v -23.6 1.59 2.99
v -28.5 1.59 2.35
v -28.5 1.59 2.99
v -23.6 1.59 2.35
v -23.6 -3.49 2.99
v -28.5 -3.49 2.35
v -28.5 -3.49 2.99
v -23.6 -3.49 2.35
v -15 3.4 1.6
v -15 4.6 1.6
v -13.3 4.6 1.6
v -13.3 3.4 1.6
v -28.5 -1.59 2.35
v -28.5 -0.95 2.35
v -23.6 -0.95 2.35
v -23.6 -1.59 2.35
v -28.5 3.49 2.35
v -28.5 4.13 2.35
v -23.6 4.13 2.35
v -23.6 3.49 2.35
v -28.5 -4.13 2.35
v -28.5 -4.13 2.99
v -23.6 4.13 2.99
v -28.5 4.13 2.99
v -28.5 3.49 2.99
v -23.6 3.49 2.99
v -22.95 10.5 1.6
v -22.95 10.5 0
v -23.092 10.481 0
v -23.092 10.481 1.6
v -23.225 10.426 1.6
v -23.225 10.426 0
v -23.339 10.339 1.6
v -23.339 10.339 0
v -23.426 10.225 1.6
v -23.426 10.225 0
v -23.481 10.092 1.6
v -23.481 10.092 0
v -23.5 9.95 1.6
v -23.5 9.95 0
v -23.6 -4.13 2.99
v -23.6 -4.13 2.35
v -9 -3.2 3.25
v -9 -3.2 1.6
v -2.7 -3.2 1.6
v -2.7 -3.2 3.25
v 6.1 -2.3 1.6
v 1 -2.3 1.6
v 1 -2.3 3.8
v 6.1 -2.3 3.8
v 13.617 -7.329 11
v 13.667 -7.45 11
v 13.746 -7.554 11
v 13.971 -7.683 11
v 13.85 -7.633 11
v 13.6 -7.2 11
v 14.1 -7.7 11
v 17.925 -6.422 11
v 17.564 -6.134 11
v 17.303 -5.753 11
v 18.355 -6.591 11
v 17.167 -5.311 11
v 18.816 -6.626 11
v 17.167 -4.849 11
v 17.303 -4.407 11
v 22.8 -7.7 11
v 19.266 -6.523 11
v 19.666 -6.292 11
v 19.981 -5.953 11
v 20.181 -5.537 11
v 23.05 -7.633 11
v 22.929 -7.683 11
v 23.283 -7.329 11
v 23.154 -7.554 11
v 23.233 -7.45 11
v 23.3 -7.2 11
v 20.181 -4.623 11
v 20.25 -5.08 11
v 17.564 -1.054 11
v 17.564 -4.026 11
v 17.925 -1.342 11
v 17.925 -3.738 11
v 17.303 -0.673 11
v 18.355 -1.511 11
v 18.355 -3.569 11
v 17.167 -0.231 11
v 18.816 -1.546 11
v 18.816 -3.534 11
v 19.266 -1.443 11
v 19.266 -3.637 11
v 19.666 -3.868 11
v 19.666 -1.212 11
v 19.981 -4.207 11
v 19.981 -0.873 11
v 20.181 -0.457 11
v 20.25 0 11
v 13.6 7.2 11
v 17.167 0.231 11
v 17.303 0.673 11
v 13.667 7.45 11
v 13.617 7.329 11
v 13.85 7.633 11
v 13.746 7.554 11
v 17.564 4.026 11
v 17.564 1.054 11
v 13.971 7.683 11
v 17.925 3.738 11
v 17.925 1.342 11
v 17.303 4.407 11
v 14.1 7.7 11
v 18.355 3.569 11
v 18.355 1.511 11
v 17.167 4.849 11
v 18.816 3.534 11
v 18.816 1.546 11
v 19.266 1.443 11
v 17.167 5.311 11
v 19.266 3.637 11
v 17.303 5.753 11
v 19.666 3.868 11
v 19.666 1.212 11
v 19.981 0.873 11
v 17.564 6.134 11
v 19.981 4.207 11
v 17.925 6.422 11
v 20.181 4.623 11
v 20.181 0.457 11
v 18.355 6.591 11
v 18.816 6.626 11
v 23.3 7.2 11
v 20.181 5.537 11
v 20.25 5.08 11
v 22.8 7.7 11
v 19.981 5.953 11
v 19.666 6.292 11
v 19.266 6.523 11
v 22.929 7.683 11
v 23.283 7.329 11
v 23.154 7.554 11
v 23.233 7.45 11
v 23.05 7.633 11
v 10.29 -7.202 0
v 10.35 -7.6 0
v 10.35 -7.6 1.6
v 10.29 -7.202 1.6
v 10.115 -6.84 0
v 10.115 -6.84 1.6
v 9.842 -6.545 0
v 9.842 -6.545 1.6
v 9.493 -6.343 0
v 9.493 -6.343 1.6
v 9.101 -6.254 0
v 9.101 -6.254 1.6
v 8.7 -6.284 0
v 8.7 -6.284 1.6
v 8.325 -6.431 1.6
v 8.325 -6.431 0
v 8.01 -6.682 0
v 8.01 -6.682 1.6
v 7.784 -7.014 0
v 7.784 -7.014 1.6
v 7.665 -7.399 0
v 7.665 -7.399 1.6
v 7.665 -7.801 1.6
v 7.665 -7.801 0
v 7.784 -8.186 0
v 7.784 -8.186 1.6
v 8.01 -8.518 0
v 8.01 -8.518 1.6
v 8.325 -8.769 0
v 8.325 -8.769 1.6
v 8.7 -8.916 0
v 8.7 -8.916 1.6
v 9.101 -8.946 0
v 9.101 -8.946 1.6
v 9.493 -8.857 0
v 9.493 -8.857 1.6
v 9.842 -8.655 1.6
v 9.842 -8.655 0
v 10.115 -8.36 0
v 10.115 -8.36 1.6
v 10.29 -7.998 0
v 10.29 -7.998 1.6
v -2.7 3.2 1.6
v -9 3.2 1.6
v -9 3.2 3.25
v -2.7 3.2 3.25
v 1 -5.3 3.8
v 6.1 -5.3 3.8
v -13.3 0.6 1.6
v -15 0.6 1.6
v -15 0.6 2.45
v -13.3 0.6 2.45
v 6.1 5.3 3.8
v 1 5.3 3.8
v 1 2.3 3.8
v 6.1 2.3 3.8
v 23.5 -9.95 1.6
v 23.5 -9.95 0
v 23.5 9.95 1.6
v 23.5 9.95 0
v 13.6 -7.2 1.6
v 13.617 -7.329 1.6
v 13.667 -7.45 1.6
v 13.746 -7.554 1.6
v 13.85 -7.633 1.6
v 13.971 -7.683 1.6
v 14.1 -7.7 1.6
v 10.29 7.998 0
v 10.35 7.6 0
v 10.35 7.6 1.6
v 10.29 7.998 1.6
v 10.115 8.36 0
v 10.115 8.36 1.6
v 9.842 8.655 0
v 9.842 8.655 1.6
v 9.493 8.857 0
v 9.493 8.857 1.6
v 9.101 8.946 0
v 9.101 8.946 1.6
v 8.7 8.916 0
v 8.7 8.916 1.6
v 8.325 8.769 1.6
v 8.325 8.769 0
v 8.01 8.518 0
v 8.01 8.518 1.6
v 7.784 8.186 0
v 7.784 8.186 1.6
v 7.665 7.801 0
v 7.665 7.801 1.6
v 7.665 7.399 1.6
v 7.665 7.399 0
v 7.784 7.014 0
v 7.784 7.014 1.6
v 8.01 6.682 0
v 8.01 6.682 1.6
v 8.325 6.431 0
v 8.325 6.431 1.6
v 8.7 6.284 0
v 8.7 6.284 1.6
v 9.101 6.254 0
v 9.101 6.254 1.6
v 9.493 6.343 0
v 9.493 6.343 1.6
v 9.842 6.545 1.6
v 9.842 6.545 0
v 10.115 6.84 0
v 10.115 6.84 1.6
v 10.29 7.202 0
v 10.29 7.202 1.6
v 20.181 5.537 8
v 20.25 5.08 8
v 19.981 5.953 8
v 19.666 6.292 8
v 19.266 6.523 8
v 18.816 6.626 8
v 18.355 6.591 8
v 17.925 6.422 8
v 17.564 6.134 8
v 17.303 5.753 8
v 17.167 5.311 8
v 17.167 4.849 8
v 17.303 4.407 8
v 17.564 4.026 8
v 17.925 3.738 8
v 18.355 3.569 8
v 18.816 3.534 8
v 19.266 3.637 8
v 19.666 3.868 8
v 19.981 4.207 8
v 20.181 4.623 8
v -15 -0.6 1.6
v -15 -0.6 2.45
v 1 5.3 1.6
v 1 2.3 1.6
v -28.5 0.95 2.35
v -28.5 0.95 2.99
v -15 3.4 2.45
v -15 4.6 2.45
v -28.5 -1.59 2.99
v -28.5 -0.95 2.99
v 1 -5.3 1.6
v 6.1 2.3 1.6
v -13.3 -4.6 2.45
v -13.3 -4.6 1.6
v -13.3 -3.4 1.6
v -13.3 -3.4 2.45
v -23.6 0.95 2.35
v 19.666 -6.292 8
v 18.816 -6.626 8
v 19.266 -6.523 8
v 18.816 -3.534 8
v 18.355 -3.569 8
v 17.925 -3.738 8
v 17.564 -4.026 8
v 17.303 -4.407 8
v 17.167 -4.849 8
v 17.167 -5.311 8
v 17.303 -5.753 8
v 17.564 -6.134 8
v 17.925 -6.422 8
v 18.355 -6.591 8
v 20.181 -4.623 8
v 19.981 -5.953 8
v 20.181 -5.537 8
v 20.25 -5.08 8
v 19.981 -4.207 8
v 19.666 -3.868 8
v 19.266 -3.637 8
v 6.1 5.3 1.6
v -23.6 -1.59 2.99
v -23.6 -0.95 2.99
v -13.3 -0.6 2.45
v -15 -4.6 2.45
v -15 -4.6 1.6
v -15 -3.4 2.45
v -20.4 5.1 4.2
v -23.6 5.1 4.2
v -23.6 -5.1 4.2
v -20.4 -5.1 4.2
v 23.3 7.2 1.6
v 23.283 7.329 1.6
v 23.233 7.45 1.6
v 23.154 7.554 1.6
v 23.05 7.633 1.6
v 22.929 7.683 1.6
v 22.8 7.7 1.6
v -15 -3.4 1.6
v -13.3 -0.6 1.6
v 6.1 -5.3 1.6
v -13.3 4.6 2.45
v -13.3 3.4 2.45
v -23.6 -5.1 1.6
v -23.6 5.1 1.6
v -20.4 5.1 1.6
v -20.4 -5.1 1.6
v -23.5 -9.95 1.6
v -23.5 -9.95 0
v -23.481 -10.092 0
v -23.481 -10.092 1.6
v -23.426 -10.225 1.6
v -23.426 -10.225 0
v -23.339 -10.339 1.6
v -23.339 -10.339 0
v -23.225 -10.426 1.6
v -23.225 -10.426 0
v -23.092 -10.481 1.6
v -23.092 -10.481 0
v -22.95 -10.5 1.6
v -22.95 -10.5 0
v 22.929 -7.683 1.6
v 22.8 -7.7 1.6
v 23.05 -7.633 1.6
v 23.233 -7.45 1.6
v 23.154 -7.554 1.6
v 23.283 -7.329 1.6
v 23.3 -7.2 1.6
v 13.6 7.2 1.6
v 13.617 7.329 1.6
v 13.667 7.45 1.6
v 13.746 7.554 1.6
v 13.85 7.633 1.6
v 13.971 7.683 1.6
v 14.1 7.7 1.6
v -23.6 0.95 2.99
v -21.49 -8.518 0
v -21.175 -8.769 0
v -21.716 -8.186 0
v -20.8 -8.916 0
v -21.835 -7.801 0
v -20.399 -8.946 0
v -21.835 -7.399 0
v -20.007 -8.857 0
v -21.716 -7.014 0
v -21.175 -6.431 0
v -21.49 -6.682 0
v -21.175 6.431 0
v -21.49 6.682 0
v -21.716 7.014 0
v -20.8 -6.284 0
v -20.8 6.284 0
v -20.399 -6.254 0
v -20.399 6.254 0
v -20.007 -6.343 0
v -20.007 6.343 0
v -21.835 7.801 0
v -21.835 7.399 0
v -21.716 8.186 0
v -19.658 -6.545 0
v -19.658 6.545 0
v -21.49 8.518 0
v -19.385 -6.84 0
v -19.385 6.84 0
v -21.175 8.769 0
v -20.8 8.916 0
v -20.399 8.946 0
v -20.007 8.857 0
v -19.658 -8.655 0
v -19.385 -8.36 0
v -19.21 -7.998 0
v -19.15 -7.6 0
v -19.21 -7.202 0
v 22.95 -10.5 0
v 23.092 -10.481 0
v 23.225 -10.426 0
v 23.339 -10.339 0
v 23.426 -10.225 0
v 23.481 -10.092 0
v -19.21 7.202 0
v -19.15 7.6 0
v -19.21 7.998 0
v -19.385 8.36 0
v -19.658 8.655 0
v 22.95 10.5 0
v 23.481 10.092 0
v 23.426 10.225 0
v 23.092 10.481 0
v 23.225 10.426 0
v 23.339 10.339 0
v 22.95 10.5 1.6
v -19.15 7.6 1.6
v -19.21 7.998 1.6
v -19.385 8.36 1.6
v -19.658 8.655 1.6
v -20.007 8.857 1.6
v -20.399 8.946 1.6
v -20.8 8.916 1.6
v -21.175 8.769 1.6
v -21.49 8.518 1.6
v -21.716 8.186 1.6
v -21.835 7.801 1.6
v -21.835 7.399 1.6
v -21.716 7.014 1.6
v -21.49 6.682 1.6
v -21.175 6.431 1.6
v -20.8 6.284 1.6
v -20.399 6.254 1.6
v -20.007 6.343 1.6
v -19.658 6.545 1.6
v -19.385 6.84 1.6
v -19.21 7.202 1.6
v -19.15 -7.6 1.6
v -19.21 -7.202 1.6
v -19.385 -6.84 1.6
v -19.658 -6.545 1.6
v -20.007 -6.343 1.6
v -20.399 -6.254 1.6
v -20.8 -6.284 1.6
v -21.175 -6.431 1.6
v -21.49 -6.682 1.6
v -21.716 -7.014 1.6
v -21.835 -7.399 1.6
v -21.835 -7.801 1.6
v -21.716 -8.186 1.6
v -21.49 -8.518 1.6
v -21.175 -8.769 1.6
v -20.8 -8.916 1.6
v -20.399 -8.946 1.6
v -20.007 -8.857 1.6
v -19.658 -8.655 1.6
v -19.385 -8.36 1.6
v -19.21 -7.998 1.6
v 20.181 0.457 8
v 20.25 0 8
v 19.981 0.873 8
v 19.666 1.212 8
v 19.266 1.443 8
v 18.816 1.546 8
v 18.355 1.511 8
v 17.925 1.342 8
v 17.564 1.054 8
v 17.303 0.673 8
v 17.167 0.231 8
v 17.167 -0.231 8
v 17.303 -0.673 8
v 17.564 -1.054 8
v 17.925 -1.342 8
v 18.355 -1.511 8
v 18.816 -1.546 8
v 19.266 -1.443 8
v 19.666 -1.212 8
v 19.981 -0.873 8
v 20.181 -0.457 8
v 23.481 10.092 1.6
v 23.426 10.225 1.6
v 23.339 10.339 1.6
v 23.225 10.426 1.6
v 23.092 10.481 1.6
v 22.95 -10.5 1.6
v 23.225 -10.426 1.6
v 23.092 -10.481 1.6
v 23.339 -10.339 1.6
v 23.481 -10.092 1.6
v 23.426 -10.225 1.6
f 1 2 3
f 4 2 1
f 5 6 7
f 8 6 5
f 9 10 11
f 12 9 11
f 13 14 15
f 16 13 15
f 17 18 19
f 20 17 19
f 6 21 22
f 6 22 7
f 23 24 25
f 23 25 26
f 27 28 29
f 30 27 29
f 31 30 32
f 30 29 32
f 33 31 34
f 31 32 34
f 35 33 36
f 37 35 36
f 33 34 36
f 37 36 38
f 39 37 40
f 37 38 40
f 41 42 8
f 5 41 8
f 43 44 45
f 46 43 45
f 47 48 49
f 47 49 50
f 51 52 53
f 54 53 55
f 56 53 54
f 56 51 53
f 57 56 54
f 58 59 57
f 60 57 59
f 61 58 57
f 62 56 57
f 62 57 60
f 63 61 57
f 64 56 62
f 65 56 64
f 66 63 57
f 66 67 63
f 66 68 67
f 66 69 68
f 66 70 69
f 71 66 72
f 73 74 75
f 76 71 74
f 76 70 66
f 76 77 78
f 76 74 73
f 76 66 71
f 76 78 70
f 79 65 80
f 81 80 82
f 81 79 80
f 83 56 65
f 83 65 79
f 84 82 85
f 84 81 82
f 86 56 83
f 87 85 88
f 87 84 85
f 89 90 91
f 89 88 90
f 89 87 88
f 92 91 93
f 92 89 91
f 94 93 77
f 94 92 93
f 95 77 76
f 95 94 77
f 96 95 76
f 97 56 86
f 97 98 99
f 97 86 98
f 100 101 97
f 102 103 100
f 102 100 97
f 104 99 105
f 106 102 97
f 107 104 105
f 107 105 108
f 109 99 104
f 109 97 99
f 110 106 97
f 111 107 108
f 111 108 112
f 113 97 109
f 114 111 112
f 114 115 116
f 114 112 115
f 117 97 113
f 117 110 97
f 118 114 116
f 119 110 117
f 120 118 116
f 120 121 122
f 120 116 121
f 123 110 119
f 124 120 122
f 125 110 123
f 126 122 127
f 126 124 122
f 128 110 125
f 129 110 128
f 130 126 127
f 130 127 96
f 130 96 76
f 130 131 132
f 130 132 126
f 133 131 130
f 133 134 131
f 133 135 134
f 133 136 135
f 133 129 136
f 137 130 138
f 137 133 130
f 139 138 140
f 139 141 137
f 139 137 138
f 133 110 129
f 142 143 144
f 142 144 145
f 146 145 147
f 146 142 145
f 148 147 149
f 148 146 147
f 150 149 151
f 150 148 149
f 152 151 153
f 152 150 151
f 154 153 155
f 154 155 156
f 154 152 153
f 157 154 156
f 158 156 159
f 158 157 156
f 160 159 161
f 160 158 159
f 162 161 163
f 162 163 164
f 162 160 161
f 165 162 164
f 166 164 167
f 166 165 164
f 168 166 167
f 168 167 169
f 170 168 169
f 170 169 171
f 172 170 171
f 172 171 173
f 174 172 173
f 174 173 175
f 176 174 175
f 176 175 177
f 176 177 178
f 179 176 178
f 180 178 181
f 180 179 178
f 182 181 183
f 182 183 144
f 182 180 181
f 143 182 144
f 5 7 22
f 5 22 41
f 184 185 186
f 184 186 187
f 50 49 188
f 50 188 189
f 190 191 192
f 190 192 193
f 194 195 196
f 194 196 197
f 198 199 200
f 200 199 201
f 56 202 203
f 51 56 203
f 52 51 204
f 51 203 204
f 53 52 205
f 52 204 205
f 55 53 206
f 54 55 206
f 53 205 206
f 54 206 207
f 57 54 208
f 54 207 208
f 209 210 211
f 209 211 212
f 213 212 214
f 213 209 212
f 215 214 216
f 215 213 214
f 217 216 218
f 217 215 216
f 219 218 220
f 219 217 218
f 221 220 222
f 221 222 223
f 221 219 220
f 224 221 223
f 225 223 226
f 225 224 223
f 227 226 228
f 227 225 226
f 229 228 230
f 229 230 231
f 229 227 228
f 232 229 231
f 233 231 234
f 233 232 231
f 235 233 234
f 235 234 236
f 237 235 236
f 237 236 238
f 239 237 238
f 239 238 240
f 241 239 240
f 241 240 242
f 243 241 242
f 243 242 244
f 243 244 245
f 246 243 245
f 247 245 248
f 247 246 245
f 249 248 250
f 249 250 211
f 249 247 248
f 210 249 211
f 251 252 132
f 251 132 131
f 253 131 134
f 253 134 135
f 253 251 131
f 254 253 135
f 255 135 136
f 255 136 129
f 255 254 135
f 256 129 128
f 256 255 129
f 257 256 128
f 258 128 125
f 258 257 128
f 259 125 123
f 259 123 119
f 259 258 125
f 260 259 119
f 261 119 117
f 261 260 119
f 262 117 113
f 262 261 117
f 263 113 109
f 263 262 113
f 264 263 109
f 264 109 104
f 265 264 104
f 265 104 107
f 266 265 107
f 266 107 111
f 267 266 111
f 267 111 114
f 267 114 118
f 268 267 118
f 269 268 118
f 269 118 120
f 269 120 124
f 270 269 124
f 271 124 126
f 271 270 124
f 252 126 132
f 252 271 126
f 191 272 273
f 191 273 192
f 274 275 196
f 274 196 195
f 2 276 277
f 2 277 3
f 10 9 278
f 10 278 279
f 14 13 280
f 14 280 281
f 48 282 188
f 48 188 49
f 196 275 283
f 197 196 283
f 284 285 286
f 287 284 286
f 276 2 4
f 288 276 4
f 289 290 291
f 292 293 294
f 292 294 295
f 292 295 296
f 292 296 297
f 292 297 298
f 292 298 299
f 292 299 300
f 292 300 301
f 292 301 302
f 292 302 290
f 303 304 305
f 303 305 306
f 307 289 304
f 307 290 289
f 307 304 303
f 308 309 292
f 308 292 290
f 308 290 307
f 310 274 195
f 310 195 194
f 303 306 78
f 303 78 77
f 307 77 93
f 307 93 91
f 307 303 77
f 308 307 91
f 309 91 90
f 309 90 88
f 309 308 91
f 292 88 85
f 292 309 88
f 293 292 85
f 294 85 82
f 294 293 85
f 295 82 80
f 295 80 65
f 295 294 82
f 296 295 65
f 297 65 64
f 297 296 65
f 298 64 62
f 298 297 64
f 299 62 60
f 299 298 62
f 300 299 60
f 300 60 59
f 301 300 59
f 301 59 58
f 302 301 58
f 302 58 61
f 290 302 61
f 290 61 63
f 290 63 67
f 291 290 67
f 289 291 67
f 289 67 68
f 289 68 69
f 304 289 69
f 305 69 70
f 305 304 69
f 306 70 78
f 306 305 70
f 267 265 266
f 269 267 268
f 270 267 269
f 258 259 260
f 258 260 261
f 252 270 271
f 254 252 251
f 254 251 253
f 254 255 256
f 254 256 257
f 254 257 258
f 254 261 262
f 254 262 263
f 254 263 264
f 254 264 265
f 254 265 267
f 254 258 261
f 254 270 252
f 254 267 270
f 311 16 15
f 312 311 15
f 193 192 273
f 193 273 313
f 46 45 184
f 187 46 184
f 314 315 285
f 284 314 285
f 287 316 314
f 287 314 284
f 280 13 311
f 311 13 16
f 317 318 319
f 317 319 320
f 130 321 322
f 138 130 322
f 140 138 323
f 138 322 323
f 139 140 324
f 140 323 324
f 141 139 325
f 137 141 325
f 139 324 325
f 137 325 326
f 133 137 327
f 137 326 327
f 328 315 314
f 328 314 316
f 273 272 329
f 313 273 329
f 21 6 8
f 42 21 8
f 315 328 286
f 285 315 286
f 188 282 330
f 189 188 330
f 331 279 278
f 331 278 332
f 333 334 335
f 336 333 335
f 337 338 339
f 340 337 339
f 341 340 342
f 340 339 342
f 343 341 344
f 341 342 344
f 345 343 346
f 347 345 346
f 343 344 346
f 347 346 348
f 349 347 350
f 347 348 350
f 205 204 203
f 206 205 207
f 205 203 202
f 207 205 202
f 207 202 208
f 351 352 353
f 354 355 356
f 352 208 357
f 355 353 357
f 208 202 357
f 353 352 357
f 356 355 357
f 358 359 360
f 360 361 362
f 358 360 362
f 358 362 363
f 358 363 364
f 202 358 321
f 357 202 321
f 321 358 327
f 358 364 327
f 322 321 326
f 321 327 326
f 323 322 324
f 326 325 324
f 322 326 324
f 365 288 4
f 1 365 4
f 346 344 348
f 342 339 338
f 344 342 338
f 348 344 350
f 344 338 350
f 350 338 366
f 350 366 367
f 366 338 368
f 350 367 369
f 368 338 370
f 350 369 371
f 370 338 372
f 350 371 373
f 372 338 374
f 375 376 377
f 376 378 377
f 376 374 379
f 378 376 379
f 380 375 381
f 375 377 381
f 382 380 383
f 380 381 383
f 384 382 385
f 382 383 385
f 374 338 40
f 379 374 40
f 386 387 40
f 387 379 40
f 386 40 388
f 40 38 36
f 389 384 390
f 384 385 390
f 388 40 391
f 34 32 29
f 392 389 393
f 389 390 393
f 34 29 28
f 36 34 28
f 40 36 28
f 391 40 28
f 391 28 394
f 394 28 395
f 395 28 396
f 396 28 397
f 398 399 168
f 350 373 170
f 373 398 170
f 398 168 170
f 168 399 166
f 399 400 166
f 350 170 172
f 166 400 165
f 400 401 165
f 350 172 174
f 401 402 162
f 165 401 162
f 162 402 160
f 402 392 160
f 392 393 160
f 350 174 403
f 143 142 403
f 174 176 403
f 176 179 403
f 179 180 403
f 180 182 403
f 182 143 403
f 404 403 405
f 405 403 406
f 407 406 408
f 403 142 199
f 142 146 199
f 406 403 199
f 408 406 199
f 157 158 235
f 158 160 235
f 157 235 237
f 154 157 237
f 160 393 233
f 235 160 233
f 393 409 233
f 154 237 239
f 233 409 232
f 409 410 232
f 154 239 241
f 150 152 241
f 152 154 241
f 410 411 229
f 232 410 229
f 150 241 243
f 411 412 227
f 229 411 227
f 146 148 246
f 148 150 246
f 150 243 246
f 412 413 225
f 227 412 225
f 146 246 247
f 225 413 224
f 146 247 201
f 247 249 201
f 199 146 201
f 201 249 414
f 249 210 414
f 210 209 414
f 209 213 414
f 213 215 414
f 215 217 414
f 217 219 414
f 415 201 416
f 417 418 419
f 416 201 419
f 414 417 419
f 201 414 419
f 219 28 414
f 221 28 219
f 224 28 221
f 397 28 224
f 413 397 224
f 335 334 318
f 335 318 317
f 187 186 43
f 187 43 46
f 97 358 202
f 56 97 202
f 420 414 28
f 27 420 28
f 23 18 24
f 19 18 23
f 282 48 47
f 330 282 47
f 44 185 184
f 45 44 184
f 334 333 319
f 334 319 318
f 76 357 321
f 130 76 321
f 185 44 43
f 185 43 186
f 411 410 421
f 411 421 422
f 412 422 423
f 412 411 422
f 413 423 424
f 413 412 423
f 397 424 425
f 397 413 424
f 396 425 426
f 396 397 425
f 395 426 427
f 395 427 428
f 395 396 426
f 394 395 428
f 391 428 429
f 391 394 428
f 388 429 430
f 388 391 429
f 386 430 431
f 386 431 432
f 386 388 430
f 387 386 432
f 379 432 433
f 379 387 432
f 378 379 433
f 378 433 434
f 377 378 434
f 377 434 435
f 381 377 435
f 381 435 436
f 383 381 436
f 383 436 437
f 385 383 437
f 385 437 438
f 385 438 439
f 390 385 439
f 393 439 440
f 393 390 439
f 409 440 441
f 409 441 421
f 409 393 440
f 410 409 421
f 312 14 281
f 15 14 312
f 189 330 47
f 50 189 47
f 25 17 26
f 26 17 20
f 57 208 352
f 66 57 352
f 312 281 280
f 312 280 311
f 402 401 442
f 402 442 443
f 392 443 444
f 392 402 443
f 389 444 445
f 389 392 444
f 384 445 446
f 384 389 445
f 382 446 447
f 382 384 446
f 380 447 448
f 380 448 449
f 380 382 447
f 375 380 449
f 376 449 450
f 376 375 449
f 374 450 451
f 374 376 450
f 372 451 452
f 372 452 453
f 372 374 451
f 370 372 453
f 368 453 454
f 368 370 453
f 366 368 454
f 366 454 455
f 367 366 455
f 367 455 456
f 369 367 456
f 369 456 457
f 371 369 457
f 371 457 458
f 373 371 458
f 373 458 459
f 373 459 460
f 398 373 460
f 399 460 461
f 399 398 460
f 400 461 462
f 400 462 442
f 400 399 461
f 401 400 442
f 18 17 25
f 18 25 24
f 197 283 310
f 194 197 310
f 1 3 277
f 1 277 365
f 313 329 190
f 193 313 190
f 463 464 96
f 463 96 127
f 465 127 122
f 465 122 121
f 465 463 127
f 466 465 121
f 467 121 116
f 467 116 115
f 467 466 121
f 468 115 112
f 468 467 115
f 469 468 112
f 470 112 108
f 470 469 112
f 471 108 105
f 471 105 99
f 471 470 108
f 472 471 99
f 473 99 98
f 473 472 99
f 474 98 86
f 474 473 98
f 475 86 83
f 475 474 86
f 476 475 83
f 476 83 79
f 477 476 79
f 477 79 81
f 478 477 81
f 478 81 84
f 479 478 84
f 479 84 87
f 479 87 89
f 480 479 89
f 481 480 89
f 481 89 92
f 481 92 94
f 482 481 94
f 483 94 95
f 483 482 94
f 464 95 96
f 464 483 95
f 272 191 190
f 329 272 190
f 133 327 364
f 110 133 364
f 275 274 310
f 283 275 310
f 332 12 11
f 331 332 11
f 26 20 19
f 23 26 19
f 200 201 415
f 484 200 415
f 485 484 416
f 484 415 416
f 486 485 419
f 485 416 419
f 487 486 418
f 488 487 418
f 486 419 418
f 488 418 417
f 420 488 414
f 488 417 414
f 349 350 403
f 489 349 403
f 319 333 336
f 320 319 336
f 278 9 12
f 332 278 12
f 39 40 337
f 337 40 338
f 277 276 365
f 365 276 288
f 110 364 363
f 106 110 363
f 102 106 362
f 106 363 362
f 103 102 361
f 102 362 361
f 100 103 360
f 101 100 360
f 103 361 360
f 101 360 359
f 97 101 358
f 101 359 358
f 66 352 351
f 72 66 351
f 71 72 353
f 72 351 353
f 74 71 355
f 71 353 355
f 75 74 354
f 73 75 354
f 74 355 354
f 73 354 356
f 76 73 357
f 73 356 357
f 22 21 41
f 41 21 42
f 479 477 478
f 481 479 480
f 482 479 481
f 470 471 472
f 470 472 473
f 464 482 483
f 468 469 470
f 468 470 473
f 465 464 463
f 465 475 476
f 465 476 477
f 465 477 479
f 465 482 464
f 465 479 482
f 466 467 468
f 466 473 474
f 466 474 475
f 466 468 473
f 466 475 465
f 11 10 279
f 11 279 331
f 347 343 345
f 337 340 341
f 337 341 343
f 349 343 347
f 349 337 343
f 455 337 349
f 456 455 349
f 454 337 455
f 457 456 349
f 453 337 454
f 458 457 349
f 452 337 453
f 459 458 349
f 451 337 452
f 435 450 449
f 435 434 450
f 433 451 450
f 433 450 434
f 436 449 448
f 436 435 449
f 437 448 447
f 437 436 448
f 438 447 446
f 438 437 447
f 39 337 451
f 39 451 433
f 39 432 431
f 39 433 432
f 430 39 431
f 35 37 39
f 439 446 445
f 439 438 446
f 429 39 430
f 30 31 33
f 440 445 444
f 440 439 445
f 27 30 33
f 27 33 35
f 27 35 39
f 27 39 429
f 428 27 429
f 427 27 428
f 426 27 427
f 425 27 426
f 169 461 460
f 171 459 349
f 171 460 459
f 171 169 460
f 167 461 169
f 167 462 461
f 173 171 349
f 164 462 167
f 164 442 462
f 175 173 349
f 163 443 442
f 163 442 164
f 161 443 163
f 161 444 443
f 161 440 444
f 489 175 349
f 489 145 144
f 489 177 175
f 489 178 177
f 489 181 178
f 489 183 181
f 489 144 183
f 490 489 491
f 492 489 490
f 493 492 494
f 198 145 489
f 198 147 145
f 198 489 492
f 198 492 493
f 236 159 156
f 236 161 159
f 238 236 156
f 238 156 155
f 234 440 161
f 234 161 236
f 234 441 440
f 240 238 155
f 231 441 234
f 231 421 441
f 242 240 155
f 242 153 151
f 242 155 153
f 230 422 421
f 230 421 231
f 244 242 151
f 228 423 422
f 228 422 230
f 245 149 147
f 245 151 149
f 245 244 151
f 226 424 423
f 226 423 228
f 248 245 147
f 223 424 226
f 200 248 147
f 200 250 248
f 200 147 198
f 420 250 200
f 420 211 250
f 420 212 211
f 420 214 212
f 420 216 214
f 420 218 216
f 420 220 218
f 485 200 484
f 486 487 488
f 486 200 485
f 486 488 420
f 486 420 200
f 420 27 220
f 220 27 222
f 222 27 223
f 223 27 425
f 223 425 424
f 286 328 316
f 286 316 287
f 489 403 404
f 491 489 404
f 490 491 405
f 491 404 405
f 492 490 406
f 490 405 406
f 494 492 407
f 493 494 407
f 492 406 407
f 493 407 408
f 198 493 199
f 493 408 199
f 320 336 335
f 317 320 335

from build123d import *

# Parameters (mm, degrees)
PCB_OVERVOLTAGE_PROTECTION_SKETCH_R = 1.35
PCB_OVERVOLTAGE_PROTECTION_DEPTH    = 1.6
TTL_2P54_HEADER_START               = 1.6
TTL_2P54_HEADER_SKETCH_W            = 3.2
TTL_2P54_HEADER_SKETCH_H            = 10.2
TTL_2P54_HEADER_DEPTH               = 2.6
FOUR_TTL_PINS_2P54_START            = 2.35
FOUR_TTL_PINS_2P54_SKETCH_W         = 4.9
FOUR_TTL_PINS_2P54_SKETCH_H         = 0.64
FOUR_TTL_PINS_2P54_DEPTH            = 0.64
FOUR_TTL_PINS_2P54_2_DEPTH          = 0.64
FOUR_TTL_PINS_2P54_3_DEPTH          = 0.64
FOUR_TTL_PINS_2P54_4_DEPTH          = 0.64
THREE_POSITION_RS485_TERMINAL_START = 1.6
THREE_POSITION_RS485_TERMINAL_DEPTH = 9.4
TERMINAL_SCREW_ACCESS_START         = 8
TERMINAL_SCREW_ACCESS_SKETCH_R      = 1.55
TERMINAL_SCREW_ACCESS_DEPTH         = 3
TRANSCEIVER_START                   = 1.6
TRANSCEIVER_SKETCH_W                = 6.3
TRANSCEIVER_SKETCH_H                = 6.4
TRANSCEIVER_DEPTH                   = 1.65
TVS_A_START                         = 1.6
TVS_A_SKETCH_W                      = 5.1
TVS_A_SKETCH_H                      = 3
TVS_A_DEPTH                         = 2.2
TVS_B_START                         = 1.6
TVS_B_SKETCH_W                      = 5.1
TVS_B_SKETCH_H                      = 3
TVS_B_DEPTH                         = 2.2
STATUS_LEDS_START                   = 1.6
STATUS_LEDS_SKETCH_W                = 1.7
STATUS_LEDS_SKETCH_H                = 1.2
STATUS_LEDS_DEPTH                   = 0.85
STATUS_LEDS_2_DEPTH                 = 0.85
STATUS_LEDS_3_DEPTH                 = 0.85


with BuildPart() as part:
    # PCB_Overvoltage_protection_Sketch → PCB_Overvoltage_protection (new body)
    with BuildSketch(Plane.XY):
        with BuildLine():
            Line((-22.95, -10.5), (22.95, -10.5))
            ThreePointArc((22.95, -10.5), (23.33890873, -10.33890873), (23.5, -9.95))
            Line((23.5, -9.95), (23.5, 9.95))
            ThreePointArc((23.5, 9.95), (23.33890873, 10.33890873), (22.95, 10.5))
            Line((22.95, 10.5), (-22.95, 10.5))
            ThreePointArc((-22.95, 10.5), (-23.33890873, 10.33890873), (-23.5, 9.95))
            Line((-23.5, 9.95), (-23.5, -9.95))
            ThreePointArc((-23.5, -9.95), (-23.33890873, -10.33890873), (-22.95, -10.5))
        make_face()
        with Locations((-20.5, -7.6)):
            Circle(PCB_OVERVOLTAGE_PROTECTION_SKETCH_R, mode=Mode.SUBTRACT)
        with Locations((-20.5, 7.6)):
            Circle(PCB_OVERVOLTAGE_PROTECTION_SKETCH_R, mode=Mode.SUBTRACT)
        with Locations((9, -7.6)):
            Circle(PCB_OVERVOLTAGE_PROTECTION_SKETCH_R, mode=Mode.SUBTRACT)
        with Locations((9, 7.6)):
            Circle(PCB_OVERVOLTAGE_PROTECTION_SKETCH_R, mode=Mode.SUBTRACT)
    extrude(amount=PCB_OVERVOLTAGE_PROTECTION_DEPTH)


with BuildPart() as body_2:
    # TTL_2p54_Header_Sketch → TTL_2p54_Header (new body)
    with BuildSketch(Plane.XY.offset(TTL_2P54_HEADER_START)):
        with Locations((-22, 0)):
            Rectangle(TTL_2P54_HEADER_SKETCH_W, TTL_2P54_HEADER_SKETCH_H)
    extrude(amount=TTL_2P54_HEADER_DEPTH)


with BuildPart() as body_3:
    # Four_TTL_Pins_2p54_Sketch → Four_TTL_Pins_2p54 (new body)
    with BuildSketch(Plane.XY.offset(FOUR_TTL_PINS_2P54_START)):
        with Locations((-26.05, -3.81)):
            Rectangle(FOUR_TTL_PINS_2P54_SKETCH_W, FOUR_TTL_PINS_2P54_SKETCH_H)
    extrude(amount=FOUR_TTL_PINS_2P54_DEPTH)


with BuildPart() as body_4:
    # Four_TTL_Pins_2p54_Sketch → Four_TTL_Pins_2p54 2 (new body)
    with BuildSketch(Plane.XY.offset(FOUR_TTL_PINS_2P54_START)):
        with Locations((-26.05, -1.27)):
            Rectangle(FOUR_TTL_PINS_2P54_SKETCH_W, FOUR_TTL_PINS_2P54_SKETCH_H)
    extrude(amount=FOUR_TTL_PINS_2P54_2_DEPTH)


with BuildPart() as body_5:
    # Four_TTL_Pins_2p54_Sketch → Four_TTL_Pins_2p54 3 (new body)
    with BuildSketch(Plane.XY.offset(FOUR_TTL_PINS_2P54_START)):
        with Locations((-26.05, 1.27)):
            Rectangle(FOUR_TTL_PINS_2P54_SKETCH_W, FOUR_TTL_PINS_2P54_SKETCH_H)
    extrude(amount=FOUR_TTL_PINS_2P54_3_DEPTH)


with BuildPart() as body_6:
    # Four_TTL_Pins_2p54_Sketch → Four_TTL_Pins_2p54 4 (new body)
    with BuildSketch(Plane.XY.offset(FOUR_TTL_PINS_2P54_START)):
        with Locations((-26.05, 3.81)):
            Rectangle(FOUR_TTL_PINS_2P54_SKETCH_W, FOUR_TTL_PINS_2P54_SKETCH_H)
    extrude(amount=FOUR_TTL_PINS_2P54_4_DEPTH)


with BuildPart() as body_7:
    # Three_position_RS485_terminal_Sketch → Three_position_RS485_terminal (new body)
    with BuildSketch(Plane.XY.offset(THREE_POSITION_RS485_TERMINAL_START)):
        with BuildLine():
            Line((14.1, -7.7), (22.8, -7.7))
            ThreePointArc((22.8, -7.7), (23.153553391, -7.553553391), (23.3, -7.2))
            Line((23.3, -7.2), (23.3, 7.2))
            ThreePointArc((23.3, 7.2), (23.153553391, 7.553553391), (22.8, 7.7))
            Line((22.8, 7.7), (14.1, 7.7))
            ThreePointArc((14.1, 7.7), (13.746446609, 7.553553391), (13.6, 7.2))
            Line((13.6, 7.2), (13.6, -7.2))
            ThreePointArc((13.6, -7.2), (13.746446609, -7.553553391), (14.1, -7.7))
        make_face()
    extrude(amount=THREE_POSITION_RS485_TERMINAL_DEPTH)

    # Terminal_screw_access_Sketch → Terminal_screw_access (cut)
    with BuildSketch(Plane.XY.offset(TERMINAL_SCREW_ACCESS_START)):
        with Locations((18.7, -5.08)):
            Circle(TERMINAL_SCREW_ACCESS_SKETCH_R)
        with Locations((18.7, 0)):
            Circle(TERMINAL_SCREW_ACCESS_SKETCH_R)
        with Locations((18.7, 5.08)):
            Circle(TERMINAL_SCREW_ACCESS_SKETCH_R)
    extrude(amount=TERMINAL_SCREW_ACCESS_DEPTH, mode=Mode.SUBTRACT)


with BuildPart() as body_8:
    # Transceiver_Sketch → Transceiver (new body)
    with BuildSketch(Plane.XY.offset(TRANSCEIVER_START)):
        with Locations((-5.85, 0)):
            Rectangle(TRANSCEIVER_SKETCH_W, TRANSCEIVER_SKETCH_H)
    extrude(amount=TRANSCEIVER_DEPTH)


with BuildPart() as body_9:
    # TVS_A_Sketch → TVS_A (new body)
    with BuildSketch(Plane.XY.offset(TVS_A_START)):
        with Locations((3.55, -3.8)):
            Rectangle(TVS_A_SKETCH_W, TVS_A_SKETCH_H)
    extrude(amount=TVS_A_DEPTH)


with BuildPart() as body_10:
    # TVS_B_Sketch → TVS_B (new body)
    with BuildSketch(Plane.XY.offset(TVS_B_START)):
        with Locations((3.55, 3.8)):
            Rectangle(TVS_B_SKETCH_W, TVS_B_SKETCH_H)
    extrude(amount=TVS_B_DEPTH)


with BuildPart() as body_11:
    # Status_LEDs_Sketch → Status_LEDs (new body)
    with BuildSketch(Plane.XY.offset(STATUS_LEDS_START)):
        with Locations((-14.15, -4)):
            Rectangle(STATUS_LEDS_SKETCH_W, STATUS_LEDS_SKETCH_H)
    extrude(amount=STATUS_LEDS_DEPTH)


with BuildPart() as body_12:
    # Status_LEDs_Sketch → Status_LEDs 2 (new body)
    with BuildSketch(Plane.XY.offset(STATUS_LEDS_START)):
        with Locations((-14.15, 0)):
            Rectangle(STATUS_LEDS_SKETCH_W, STATUS_LEDS_SKETCH_H)
    extrude(amount=STATUS_LEDS_2_DEPTH)


with BuildPart() as body_13:
    # Status_LEDs_Sketch → Status_LEDs 3 (new body)
    with BuildSketch(Plane.XY.offset(STATUS_LEDS_START)):
        with Locations((-14.15, 4)):
            Rectangle(STATUS_LEDS_SKETCH_W, STATUS_LEDS_SKETCH_H)
    extrude(amount=STATUS_LEDS_3_DEPTH)


solid = Compound([part.part, body_2.part, body_3.part, body_4.part, body_5.part, body_6.part, body_7.part, body_8.part, body_9.part, body_10.part, body_11.part, body_12.part, body_13.part])
